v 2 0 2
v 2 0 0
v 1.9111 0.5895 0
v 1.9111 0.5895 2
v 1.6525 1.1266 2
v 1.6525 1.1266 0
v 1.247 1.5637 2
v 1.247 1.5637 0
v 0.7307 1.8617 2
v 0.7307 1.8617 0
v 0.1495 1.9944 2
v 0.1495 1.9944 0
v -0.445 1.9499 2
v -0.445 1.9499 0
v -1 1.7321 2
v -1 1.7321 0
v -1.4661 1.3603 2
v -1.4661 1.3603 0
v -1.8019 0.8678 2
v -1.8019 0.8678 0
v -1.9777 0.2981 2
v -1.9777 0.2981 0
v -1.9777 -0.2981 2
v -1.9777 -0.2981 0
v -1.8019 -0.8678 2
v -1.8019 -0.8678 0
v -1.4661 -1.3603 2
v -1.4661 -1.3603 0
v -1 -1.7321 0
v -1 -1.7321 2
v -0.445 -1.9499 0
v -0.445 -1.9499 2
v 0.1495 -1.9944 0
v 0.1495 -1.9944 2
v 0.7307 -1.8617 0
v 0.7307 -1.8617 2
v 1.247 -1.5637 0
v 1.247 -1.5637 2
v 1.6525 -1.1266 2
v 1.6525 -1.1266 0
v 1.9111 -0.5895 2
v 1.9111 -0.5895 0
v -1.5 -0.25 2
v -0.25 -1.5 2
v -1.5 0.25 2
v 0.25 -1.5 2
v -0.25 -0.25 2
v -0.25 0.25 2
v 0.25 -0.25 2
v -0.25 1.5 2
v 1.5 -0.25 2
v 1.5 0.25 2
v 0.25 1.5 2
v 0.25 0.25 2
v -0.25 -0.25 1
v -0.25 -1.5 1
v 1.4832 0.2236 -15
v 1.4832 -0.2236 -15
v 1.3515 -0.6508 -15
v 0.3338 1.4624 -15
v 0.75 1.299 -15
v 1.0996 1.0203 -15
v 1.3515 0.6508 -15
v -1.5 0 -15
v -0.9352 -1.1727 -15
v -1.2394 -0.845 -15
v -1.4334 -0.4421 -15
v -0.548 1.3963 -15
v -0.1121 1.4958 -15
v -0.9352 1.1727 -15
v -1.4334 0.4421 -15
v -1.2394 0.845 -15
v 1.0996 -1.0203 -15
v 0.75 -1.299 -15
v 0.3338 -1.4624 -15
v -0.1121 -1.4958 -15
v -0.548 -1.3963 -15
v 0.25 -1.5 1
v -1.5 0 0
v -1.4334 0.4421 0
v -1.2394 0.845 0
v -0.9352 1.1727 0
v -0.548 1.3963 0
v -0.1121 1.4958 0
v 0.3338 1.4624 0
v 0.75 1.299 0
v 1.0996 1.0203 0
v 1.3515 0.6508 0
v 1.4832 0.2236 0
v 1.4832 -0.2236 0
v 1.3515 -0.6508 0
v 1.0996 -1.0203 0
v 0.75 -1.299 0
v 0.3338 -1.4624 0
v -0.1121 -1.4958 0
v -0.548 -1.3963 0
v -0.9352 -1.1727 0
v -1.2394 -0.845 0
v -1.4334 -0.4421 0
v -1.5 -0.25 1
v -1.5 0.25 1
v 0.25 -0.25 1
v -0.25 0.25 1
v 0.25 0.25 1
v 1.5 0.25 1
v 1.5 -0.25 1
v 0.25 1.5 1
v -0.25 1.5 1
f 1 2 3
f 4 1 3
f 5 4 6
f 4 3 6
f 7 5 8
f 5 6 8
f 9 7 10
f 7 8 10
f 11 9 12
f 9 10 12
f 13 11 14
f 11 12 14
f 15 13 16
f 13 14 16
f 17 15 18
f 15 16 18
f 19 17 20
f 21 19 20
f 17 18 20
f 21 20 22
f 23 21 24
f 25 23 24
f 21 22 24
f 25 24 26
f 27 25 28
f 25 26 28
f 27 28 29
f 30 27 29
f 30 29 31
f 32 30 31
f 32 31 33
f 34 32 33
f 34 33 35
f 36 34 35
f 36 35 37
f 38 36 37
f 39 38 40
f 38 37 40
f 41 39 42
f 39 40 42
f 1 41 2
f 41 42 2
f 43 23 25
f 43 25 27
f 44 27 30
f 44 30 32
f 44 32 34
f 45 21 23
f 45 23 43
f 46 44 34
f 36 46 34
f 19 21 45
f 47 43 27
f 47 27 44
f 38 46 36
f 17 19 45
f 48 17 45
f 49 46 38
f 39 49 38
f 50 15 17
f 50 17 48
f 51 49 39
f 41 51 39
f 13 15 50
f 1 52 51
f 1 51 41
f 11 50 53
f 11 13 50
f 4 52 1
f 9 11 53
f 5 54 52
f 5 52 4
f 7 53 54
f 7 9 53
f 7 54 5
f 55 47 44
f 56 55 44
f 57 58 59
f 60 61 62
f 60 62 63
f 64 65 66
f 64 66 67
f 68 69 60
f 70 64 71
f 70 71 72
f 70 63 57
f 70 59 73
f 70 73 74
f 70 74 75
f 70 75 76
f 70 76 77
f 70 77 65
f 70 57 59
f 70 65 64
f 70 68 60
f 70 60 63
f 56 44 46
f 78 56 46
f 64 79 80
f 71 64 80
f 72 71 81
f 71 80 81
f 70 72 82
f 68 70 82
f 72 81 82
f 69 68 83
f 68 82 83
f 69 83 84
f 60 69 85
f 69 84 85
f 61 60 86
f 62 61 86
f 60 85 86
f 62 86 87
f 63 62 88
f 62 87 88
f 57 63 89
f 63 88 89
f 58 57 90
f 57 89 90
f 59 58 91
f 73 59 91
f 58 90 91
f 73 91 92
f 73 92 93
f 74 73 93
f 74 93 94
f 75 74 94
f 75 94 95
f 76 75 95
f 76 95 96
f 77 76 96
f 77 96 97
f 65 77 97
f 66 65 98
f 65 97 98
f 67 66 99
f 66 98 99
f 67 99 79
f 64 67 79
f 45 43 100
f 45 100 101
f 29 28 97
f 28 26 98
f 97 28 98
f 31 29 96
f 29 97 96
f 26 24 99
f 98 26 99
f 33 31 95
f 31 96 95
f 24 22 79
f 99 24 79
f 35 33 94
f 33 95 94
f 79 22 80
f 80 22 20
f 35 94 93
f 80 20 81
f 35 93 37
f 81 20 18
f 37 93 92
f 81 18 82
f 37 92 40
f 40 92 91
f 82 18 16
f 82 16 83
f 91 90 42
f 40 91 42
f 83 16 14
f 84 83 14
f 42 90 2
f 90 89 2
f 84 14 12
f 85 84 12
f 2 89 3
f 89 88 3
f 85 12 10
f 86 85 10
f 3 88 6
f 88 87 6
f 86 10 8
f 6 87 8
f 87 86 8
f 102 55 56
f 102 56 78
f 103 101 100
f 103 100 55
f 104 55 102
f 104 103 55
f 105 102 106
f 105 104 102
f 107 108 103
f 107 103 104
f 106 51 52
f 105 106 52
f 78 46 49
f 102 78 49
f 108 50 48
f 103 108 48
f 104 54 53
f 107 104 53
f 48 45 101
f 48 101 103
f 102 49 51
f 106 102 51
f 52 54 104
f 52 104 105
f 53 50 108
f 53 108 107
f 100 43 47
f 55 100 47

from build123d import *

# Parameters (mm, degrees)
SKETCH1_R           = 2
BOSS_EXTRUDE1_DEPTH = 2
SKETCH2_R           = 1.5
BOSS_EXTRUDE2_DEPTH = 15
SKETCH4_W           = 0.5
SKETCH4_H           = 1.25
SKETCH4_H_2         = 0.5
SKETCH4_W_2         = 1.25
CUT_EXTRUDE1_DEPTH  = 1


with BuildPart() as part:
    # Sketch1 → Boss-Extrude1 (new body)
    with BuildSketch(Plane.XY):
        Circle(SKETCH1_R)
    extrude(amount=BOSS_EXTRUDE1_DEPTH)

    # Sketch2 → Boss-Extrude2 (add)
    with BuildSketch(Plane(origin=(0, 0, 0), x_dir=(-1, 0, 0), z_dir=(0, 0, -1))):
        Circle(SKETCH2_R)
    extrude(amount=BOSS_EXTRUDE2_DEPTH)

    # Sketch4 → Cut-Extrude1 (cut)
    with BuildSketch(Plane.XY.offset(2)):
        with Locations((0, 0.875)):
            Rectangle(SKETCH4_W, SKETCH4_H)
        Rectangle(SKETCH4_W, SKETCH4_H_2)
        with Locations((0.875, 0)):
            Rectangle(SKETCH4_W_2, SKETCH4_H_2)
        with Locations((0, -0.875)):
            Rectangle(SKETCH4_W, SKETCH4_H)
        with Locations((-0.875, 0)):
            Rectangle(SKETCH4_W_2, SKETCH4_H_2)
    extrude(amount=-CUT_EXTRUDE1_DEPTH, mode=Mode.SUBTRACT)


solid = part.part
